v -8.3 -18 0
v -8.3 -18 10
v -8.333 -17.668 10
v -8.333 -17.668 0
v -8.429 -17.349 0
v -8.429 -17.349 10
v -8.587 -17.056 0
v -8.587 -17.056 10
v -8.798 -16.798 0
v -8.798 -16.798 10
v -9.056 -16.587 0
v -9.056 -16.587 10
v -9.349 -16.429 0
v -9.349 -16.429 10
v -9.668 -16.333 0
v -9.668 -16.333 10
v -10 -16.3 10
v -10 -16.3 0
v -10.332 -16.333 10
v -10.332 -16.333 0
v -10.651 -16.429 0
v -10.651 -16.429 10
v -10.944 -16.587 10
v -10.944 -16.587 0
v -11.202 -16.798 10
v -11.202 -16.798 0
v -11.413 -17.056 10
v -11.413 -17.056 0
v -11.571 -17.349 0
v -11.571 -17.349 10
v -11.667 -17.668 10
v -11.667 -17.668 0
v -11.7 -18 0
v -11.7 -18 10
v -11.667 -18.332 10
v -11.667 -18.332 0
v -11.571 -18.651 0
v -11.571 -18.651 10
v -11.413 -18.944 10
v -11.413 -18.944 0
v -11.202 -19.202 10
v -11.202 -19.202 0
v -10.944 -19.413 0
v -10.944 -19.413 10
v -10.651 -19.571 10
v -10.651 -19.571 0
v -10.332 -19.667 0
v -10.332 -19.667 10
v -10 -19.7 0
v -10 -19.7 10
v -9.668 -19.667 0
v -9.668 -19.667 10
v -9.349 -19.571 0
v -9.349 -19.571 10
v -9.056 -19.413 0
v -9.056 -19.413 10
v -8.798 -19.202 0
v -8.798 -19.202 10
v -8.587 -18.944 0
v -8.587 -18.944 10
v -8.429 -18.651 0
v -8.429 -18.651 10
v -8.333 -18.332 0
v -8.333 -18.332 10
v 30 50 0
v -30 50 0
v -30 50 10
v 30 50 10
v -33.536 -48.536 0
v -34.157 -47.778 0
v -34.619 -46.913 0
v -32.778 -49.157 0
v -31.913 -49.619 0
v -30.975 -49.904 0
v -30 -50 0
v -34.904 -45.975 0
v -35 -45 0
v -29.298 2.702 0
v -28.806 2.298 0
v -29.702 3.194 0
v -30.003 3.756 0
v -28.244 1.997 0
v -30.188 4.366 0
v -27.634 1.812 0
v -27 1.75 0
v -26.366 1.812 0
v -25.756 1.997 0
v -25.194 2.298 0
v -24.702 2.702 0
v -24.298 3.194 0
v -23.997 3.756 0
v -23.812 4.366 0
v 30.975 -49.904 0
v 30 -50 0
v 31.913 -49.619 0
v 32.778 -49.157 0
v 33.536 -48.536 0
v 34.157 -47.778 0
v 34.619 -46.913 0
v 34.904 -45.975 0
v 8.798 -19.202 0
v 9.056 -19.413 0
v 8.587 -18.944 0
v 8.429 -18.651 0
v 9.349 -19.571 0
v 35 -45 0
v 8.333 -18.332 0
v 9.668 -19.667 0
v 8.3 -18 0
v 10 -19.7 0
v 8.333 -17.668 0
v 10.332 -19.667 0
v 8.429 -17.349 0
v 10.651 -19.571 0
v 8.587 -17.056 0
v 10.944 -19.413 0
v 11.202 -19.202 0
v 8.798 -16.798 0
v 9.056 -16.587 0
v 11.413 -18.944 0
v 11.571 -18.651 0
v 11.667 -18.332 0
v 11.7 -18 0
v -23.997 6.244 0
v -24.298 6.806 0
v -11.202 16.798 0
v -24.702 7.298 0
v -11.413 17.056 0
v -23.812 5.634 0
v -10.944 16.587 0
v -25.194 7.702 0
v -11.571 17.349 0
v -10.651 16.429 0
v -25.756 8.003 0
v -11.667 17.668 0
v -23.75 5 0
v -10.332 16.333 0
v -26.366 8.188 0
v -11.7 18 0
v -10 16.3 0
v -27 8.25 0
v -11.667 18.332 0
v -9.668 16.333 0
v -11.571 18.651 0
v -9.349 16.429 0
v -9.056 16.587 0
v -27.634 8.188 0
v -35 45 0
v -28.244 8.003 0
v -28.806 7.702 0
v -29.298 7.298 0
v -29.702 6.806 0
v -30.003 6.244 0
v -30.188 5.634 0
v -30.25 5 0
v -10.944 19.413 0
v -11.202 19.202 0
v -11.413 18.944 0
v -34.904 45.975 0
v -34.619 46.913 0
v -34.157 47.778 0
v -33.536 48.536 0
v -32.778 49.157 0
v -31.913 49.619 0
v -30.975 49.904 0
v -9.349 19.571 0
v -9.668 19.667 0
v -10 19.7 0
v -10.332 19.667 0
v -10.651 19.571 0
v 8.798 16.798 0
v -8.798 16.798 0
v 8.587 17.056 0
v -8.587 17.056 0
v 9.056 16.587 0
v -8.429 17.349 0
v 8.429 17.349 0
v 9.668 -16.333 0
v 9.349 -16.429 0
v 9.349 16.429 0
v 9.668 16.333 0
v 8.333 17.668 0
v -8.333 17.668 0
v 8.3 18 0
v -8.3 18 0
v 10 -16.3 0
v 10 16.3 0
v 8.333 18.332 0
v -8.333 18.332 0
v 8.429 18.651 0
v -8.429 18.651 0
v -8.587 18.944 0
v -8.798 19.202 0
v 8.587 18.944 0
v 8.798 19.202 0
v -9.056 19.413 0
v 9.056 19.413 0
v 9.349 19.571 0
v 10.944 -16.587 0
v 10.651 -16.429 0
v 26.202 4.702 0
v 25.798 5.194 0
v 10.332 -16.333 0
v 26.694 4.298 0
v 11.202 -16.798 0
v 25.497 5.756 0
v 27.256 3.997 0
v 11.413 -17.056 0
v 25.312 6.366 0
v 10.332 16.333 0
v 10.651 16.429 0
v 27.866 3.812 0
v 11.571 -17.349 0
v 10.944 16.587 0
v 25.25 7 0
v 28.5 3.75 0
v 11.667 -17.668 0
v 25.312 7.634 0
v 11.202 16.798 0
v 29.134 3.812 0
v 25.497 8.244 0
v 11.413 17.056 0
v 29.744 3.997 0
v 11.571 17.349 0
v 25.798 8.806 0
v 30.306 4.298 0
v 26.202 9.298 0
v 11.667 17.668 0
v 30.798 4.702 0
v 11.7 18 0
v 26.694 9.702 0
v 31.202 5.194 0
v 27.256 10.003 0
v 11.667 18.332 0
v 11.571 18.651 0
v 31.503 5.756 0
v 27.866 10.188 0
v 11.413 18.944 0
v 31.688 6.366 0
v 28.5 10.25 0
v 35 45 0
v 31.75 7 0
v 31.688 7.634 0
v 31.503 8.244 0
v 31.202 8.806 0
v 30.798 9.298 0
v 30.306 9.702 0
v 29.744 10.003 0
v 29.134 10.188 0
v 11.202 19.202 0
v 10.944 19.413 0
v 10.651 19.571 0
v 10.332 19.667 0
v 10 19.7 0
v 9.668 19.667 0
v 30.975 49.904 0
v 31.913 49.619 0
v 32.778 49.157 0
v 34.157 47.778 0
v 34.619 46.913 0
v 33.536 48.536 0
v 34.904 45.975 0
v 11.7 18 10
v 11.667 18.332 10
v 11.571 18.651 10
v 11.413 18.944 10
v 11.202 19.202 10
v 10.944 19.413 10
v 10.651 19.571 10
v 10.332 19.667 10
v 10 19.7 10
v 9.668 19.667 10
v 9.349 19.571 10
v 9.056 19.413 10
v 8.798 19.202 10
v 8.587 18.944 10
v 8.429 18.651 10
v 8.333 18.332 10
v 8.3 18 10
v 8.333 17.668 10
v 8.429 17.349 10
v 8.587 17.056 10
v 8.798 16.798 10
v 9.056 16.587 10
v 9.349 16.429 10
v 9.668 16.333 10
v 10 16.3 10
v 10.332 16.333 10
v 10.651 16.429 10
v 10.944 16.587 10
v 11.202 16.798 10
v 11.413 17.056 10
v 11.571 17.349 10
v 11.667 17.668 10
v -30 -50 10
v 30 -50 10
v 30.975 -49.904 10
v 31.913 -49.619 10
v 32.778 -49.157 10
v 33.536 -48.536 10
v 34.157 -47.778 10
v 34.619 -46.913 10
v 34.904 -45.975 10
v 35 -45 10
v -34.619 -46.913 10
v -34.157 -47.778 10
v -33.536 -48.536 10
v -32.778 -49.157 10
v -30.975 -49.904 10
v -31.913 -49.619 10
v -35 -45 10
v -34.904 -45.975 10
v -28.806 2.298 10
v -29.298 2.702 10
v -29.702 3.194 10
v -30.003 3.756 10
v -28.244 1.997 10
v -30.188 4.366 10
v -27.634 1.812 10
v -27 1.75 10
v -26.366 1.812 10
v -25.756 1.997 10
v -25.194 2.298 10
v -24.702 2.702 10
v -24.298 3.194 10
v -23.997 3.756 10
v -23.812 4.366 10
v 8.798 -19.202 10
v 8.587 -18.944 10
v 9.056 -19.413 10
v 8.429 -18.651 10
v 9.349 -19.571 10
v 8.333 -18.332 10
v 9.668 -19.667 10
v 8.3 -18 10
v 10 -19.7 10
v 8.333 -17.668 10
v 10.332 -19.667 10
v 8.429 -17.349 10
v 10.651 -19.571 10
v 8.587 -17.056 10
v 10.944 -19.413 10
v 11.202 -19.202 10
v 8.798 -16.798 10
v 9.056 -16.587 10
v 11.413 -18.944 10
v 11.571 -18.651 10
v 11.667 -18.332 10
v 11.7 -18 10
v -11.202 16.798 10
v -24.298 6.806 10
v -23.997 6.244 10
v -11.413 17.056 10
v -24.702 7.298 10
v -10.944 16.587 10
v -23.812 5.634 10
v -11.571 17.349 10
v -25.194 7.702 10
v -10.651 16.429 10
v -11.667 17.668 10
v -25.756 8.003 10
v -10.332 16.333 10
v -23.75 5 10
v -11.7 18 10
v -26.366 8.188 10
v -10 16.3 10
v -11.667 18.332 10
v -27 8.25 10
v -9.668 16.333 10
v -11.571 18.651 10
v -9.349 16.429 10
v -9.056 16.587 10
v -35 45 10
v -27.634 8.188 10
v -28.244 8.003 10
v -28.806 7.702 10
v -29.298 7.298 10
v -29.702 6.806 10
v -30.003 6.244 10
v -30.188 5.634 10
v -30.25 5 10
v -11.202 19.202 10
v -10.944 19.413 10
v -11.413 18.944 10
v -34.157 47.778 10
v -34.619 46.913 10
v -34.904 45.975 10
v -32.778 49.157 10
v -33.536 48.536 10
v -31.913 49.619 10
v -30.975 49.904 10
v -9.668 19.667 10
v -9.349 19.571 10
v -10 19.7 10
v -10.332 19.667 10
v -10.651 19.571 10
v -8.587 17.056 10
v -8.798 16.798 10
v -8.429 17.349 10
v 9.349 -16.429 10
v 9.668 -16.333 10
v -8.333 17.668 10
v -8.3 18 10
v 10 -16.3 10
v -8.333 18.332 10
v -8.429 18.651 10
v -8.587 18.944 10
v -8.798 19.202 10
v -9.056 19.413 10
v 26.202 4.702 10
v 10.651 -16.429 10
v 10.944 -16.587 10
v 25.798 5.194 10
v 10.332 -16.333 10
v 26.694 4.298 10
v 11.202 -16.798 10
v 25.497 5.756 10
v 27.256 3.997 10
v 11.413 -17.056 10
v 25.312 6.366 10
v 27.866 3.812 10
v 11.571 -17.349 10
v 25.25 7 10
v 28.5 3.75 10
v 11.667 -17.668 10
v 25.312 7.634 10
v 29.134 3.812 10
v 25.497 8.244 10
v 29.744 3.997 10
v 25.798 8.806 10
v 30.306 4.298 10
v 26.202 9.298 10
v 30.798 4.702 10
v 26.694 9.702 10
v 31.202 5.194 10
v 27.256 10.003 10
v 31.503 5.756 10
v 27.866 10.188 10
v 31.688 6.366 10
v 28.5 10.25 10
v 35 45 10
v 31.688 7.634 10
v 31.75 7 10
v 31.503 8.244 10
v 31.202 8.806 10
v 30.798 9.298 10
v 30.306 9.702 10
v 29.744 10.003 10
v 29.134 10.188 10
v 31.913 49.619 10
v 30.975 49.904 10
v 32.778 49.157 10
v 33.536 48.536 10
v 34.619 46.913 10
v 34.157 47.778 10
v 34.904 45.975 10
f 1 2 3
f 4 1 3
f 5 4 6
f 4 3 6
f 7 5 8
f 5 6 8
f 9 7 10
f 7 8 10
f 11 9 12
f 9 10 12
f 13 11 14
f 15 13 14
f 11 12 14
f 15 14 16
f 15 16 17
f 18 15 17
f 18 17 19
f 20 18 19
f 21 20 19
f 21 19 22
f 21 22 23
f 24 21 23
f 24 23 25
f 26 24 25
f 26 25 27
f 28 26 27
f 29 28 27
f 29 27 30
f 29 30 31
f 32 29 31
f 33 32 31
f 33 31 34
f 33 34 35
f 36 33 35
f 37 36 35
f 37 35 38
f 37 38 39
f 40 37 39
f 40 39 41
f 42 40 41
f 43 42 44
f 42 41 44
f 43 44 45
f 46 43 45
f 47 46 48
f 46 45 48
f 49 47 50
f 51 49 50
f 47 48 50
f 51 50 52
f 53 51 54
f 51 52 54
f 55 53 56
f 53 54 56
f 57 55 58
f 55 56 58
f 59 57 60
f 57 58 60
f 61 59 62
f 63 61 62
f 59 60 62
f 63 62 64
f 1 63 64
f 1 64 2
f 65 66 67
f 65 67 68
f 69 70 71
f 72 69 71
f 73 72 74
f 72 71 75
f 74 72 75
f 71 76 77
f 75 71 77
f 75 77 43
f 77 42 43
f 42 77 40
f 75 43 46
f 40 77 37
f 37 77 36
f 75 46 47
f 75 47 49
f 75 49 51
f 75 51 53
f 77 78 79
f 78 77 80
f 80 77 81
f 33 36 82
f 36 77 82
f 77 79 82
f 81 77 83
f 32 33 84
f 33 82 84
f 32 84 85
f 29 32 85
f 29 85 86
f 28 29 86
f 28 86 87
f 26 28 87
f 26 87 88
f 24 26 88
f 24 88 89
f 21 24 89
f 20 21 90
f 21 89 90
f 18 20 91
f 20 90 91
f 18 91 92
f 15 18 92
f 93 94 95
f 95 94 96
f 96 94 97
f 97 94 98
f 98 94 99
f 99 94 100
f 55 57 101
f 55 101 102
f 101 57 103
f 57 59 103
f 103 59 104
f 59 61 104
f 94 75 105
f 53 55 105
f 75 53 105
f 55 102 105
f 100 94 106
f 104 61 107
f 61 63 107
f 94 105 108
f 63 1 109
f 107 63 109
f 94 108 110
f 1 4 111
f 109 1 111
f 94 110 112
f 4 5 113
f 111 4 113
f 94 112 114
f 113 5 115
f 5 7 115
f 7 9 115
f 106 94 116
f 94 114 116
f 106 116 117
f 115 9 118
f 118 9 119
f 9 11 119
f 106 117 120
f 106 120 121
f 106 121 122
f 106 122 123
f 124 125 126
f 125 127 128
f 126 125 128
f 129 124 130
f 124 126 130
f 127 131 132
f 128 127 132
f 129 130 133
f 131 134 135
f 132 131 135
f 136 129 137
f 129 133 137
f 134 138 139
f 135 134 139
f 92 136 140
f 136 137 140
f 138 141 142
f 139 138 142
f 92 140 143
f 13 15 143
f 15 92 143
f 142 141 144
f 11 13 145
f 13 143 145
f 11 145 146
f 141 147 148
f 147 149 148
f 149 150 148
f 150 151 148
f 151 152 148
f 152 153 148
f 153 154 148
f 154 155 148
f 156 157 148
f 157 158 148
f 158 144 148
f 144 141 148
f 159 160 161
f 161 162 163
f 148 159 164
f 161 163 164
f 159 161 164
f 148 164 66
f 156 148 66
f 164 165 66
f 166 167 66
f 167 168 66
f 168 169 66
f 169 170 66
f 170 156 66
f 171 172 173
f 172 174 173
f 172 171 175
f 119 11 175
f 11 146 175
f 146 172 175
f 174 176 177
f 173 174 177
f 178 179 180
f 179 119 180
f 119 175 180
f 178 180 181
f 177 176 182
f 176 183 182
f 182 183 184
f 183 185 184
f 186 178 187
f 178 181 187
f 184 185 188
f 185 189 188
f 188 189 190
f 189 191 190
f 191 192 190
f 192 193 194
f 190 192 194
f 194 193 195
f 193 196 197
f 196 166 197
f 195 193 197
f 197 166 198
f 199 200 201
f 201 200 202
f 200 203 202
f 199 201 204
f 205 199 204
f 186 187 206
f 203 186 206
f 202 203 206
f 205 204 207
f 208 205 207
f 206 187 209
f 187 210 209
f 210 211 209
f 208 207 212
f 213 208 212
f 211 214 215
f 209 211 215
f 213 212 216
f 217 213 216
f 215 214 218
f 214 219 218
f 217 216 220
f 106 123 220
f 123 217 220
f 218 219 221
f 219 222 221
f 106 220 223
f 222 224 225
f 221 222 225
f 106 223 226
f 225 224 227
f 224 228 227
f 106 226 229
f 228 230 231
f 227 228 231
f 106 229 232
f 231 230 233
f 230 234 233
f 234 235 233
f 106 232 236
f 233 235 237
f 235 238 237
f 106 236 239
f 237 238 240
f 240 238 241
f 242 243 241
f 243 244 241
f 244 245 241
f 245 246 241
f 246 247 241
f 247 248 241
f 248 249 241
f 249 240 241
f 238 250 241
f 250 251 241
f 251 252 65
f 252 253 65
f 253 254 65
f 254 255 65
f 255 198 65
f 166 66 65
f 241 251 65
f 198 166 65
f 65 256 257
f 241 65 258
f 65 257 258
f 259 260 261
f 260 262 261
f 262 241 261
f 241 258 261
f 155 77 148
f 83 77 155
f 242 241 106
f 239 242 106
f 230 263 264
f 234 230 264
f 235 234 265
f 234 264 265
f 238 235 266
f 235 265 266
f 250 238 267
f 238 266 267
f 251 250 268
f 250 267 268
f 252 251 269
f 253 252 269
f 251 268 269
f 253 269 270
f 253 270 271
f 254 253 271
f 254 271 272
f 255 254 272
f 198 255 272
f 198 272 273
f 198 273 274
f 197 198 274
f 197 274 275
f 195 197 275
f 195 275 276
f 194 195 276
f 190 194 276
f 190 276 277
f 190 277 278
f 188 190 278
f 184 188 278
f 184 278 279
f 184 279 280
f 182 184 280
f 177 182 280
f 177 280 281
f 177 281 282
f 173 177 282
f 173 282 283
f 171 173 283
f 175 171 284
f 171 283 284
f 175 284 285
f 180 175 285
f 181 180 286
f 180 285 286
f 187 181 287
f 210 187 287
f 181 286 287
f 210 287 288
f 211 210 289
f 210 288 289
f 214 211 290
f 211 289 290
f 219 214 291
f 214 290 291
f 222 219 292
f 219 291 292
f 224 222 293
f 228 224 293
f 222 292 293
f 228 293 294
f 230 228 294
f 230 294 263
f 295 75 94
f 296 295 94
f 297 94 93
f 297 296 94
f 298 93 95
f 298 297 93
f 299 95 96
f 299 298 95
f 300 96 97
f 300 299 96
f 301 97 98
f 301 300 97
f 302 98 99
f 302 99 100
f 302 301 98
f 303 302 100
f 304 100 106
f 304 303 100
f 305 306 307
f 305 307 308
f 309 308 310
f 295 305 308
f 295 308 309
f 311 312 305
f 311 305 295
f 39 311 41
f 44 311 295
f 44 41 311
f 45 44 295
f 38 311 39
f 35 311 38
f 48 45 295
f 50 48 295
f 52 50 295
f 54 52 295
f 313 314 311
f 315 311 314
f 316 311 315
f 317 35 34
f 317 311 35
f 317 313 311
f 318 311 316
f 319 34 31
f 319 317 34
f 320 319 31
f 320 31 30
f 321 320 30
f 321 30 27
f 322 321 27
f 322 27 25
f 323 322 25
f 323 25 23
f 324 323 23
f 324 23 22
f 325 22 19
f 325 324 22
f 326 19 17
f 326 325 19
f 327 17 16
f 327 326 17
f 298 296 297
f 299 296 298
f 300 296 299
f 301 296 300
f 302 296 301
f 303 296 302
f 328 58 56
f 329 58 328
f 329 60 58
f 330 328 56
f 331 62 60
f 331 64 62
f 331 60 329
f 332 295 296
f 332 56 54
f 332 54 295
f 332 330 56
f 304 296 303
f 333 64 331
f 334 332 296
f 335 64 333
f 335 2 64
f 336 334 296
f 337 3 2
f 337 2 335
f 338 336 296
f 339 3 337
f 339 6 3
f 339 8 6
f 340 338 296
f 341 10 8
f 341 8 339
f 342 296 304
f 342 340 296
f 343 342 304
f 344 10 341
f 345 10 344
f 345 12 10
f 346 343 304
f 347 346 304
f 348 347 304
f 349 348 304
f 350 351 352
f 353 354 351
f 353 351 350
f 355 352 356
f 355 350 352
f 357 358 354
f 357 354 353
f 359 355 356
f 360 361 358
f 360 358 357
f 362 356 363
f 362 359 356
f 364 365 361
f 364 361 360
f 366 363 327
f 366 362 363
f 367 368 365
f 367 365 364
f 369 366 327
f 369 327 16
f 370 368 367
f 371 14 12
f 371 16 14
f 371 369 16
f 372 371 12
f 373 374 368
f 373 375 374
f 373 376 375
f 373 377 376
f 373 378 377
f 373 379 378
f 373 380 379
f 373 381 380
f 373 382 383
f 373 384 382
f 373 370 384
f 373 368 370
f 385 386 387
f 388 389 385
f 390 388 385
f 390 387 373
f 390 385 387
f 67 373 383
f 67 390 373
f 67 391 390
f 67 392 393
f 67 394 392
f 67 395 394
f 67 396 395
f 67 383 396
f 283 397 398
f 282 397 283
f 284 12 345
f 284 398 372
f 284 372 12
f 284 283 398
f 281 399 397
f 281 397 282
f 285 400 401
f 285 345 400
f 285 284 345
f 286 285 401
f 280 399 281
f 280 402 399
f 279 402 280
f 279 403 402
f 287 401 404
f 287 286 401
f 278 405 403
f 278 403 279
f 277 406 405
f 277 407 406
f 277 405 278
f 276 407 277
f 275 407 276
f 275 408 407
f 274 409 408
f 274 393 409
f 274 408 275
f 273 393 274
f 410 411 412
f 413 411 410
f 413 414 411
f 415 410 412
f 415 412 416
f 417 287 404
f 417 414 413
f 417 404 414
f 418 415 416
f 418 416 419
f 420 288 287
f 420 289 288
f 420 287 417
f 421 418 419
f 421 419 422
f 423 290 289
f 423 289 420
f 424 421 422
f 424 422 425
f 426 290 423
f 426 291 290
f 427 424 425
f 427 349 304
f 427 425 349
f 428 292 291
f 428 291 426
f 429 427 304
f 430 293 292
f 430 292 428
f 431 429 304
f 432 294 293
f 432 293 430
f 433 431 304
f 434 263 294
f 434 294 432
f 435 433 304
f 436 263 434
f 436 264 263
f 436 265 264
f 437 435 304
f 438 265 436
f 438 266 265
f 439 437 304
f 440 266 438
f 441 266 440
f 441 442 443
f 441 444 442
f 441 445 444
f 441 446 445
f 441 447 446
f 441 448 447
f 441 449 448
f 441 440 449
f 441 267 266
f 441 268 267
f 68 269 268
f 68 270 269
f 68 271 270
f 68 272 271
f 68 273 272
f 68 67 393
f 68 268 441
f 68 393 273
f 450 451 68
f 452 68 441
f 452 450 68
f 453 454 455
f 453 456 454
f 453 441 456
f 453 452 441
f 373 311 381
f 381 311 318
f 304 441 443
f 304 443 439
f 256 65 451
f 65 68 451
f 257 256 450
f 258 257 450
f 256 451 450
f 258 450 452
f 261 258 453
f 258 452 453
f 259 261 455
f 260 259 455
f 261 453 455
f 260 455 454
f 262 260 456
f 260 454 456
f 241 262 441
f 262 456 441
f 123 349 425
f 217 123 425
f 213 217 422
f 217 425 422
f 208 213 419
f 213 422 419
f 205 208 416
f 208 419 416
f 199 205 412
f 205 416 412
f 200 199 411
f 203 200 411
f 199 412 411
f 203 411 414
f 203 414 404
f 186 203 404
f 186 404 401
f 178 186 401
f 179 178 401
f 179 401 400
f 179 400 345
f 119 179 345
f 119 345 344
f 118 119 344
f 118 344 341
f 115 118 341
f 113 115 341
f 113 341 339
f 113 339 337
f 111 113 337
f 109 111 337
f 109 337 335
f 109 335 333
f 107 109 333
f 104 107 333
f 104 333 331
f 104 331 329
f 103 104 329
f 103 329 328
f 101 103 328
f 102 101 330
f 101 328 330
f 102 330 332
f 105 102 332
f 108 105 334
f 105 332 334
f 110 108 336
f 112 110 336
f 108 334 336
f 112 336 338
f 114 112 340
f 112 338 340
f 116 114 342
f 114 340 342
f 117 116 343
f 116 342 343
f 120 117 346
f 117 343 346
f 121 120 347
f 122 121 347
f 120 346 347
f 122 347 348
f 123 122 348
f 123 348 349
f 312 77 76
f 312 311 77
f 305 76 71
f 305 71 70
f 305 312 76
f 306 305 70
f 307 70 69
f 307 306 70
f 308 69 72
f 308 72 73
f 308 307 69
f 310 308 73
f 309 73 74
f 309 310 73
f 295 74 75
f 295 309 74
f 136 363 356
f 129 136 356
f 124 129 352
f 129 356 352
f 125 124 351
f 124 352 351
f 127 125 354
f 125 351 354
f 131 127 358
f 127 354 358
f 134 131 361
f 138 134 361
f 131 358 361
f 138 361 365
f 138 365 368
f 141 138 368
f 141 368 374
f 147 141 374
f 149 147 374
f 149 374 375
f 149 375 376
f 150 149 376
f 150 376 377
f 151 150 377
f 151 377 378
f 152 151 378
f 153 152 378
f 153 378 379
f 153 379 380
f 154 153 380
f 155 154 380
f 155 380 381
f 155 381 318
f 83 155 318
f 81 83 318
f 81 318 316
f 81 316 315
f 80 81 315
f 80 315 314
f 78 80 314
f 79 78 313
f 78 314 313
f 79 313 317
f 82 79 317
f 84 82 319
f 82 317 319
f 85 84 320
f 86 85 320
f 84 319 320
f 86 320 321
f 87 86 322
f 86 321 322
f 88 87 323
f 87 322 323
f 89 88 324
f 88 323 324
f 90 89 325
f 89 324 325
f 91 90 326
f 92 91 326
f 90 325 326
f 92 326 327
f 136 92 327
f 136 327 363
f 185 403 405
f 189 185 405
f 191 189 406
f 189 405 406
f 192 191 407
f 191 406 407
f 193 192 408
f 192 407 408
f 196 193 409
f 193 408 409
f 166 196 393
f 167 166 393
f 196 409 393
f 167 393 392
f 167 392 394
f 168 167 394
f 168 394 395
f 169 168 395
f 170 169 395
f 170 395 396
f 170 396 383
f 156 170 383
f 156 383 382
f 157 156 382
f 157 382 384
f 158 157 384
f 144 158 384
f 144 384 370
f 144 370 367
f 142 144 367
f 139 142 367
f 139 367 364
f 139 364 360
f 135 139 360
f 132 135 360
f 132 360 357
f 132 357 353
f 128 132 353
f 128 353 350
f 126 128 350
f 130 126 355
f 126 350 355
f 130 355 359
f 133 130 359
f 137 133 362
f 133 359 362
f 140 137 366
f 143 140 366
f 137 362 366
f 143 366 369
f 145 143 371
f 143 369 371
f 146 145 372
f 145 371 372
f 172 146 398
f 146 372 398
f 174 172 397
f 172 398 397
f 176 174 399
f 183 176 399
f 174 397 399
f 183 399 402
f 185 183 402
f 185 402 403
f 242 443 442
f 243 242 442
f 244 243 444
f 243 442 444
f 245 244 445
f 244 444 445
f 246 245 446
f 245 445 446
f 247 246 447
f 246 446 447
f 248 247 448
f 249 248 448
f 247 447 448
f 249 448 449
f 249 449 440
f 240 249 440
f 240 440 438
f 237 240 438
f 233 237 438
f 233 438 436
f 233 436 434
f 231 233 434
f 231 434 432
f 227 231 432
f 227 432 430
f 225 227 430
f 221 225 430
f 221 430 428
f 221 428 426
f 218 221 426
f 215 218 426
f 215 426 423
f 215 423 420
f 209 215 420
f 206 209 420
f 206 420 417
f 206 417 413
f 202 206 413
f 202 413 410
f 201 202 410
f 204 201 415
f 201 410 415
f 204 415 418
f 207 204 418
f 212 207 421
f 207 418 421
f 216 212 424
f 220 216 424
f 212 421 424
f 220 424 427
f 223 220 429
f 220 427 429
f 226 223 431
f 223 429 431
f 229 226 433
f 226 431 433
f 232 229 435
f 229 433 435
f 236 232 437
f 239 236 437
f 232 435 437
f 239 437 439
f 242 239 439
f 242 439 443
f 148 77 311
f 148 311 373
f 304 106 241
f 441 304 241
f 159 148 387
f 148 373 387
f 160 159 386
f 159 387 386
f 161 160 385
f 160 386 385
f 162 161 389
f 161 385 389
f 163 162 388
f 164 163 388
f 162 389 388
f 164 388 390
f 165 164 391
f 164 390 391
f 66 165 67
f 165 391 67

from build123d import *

# Parameters (mm, degrees)
SKETCH_W        = 70
SKETCH_H        = 100
PAD_DEPTH       = 10
SKETCH001_R     = 3.25
POCKET_DEPTH    = 10.001
SKETCH002_R     = 1.7
POCKET001_DEPTH = 10.001
FILLET_R        = 5


with BuildPart() as part:
    # Sketch → Pad (new body)
    with BuildSketch(Plane.XY):
        Rectangle(SKETCH_W, SKETCH_H)
    extrude(amount=PAD_DEPTH)

    # Sketch001 (on Face6 of Pad) → Pocket (cut, through all)
    with BuildSketch(Plane.XY.offset(10)):
        with Locations((-27, 5)):
            Circle(SKETCH001_R)
        with Locations((28.5, 7)):
            Circle(SKETCH001_R)
    extrude(amount=-POCKET_DEPTH, mode=Mode.SUBTRACT)

    # Sketch002 (on Face5 of Pocket) → Pocket001 (cut, through all)
    with BuildSketch(Plane.XY.offset(10)):
        with Locations((-10, 18)):
            Circle(SKETCH002_R)
        with Locations((10, 18)):
            Circle(SKETCH002_R)
        with Locations((10, -18)):
            Circle(SKETCH002_R)
        with Locations((-10, -18)):
            Circle(SKETCH002_R)
    extrude(amount=-POCKET001_DEPTH, mode=Mode.SUBTRACT)

    # Fillet
    fillet_edges = [part.edges().sort_by_distance(p)[0] for p in [
        (35, -50, 5),
        (-35, -50, 5),
        (35, 50, 5),
        (-35, 50, 5),
    ]]
    fillet(fillet_edges, radius=FILLET_R)


solid = part.part
